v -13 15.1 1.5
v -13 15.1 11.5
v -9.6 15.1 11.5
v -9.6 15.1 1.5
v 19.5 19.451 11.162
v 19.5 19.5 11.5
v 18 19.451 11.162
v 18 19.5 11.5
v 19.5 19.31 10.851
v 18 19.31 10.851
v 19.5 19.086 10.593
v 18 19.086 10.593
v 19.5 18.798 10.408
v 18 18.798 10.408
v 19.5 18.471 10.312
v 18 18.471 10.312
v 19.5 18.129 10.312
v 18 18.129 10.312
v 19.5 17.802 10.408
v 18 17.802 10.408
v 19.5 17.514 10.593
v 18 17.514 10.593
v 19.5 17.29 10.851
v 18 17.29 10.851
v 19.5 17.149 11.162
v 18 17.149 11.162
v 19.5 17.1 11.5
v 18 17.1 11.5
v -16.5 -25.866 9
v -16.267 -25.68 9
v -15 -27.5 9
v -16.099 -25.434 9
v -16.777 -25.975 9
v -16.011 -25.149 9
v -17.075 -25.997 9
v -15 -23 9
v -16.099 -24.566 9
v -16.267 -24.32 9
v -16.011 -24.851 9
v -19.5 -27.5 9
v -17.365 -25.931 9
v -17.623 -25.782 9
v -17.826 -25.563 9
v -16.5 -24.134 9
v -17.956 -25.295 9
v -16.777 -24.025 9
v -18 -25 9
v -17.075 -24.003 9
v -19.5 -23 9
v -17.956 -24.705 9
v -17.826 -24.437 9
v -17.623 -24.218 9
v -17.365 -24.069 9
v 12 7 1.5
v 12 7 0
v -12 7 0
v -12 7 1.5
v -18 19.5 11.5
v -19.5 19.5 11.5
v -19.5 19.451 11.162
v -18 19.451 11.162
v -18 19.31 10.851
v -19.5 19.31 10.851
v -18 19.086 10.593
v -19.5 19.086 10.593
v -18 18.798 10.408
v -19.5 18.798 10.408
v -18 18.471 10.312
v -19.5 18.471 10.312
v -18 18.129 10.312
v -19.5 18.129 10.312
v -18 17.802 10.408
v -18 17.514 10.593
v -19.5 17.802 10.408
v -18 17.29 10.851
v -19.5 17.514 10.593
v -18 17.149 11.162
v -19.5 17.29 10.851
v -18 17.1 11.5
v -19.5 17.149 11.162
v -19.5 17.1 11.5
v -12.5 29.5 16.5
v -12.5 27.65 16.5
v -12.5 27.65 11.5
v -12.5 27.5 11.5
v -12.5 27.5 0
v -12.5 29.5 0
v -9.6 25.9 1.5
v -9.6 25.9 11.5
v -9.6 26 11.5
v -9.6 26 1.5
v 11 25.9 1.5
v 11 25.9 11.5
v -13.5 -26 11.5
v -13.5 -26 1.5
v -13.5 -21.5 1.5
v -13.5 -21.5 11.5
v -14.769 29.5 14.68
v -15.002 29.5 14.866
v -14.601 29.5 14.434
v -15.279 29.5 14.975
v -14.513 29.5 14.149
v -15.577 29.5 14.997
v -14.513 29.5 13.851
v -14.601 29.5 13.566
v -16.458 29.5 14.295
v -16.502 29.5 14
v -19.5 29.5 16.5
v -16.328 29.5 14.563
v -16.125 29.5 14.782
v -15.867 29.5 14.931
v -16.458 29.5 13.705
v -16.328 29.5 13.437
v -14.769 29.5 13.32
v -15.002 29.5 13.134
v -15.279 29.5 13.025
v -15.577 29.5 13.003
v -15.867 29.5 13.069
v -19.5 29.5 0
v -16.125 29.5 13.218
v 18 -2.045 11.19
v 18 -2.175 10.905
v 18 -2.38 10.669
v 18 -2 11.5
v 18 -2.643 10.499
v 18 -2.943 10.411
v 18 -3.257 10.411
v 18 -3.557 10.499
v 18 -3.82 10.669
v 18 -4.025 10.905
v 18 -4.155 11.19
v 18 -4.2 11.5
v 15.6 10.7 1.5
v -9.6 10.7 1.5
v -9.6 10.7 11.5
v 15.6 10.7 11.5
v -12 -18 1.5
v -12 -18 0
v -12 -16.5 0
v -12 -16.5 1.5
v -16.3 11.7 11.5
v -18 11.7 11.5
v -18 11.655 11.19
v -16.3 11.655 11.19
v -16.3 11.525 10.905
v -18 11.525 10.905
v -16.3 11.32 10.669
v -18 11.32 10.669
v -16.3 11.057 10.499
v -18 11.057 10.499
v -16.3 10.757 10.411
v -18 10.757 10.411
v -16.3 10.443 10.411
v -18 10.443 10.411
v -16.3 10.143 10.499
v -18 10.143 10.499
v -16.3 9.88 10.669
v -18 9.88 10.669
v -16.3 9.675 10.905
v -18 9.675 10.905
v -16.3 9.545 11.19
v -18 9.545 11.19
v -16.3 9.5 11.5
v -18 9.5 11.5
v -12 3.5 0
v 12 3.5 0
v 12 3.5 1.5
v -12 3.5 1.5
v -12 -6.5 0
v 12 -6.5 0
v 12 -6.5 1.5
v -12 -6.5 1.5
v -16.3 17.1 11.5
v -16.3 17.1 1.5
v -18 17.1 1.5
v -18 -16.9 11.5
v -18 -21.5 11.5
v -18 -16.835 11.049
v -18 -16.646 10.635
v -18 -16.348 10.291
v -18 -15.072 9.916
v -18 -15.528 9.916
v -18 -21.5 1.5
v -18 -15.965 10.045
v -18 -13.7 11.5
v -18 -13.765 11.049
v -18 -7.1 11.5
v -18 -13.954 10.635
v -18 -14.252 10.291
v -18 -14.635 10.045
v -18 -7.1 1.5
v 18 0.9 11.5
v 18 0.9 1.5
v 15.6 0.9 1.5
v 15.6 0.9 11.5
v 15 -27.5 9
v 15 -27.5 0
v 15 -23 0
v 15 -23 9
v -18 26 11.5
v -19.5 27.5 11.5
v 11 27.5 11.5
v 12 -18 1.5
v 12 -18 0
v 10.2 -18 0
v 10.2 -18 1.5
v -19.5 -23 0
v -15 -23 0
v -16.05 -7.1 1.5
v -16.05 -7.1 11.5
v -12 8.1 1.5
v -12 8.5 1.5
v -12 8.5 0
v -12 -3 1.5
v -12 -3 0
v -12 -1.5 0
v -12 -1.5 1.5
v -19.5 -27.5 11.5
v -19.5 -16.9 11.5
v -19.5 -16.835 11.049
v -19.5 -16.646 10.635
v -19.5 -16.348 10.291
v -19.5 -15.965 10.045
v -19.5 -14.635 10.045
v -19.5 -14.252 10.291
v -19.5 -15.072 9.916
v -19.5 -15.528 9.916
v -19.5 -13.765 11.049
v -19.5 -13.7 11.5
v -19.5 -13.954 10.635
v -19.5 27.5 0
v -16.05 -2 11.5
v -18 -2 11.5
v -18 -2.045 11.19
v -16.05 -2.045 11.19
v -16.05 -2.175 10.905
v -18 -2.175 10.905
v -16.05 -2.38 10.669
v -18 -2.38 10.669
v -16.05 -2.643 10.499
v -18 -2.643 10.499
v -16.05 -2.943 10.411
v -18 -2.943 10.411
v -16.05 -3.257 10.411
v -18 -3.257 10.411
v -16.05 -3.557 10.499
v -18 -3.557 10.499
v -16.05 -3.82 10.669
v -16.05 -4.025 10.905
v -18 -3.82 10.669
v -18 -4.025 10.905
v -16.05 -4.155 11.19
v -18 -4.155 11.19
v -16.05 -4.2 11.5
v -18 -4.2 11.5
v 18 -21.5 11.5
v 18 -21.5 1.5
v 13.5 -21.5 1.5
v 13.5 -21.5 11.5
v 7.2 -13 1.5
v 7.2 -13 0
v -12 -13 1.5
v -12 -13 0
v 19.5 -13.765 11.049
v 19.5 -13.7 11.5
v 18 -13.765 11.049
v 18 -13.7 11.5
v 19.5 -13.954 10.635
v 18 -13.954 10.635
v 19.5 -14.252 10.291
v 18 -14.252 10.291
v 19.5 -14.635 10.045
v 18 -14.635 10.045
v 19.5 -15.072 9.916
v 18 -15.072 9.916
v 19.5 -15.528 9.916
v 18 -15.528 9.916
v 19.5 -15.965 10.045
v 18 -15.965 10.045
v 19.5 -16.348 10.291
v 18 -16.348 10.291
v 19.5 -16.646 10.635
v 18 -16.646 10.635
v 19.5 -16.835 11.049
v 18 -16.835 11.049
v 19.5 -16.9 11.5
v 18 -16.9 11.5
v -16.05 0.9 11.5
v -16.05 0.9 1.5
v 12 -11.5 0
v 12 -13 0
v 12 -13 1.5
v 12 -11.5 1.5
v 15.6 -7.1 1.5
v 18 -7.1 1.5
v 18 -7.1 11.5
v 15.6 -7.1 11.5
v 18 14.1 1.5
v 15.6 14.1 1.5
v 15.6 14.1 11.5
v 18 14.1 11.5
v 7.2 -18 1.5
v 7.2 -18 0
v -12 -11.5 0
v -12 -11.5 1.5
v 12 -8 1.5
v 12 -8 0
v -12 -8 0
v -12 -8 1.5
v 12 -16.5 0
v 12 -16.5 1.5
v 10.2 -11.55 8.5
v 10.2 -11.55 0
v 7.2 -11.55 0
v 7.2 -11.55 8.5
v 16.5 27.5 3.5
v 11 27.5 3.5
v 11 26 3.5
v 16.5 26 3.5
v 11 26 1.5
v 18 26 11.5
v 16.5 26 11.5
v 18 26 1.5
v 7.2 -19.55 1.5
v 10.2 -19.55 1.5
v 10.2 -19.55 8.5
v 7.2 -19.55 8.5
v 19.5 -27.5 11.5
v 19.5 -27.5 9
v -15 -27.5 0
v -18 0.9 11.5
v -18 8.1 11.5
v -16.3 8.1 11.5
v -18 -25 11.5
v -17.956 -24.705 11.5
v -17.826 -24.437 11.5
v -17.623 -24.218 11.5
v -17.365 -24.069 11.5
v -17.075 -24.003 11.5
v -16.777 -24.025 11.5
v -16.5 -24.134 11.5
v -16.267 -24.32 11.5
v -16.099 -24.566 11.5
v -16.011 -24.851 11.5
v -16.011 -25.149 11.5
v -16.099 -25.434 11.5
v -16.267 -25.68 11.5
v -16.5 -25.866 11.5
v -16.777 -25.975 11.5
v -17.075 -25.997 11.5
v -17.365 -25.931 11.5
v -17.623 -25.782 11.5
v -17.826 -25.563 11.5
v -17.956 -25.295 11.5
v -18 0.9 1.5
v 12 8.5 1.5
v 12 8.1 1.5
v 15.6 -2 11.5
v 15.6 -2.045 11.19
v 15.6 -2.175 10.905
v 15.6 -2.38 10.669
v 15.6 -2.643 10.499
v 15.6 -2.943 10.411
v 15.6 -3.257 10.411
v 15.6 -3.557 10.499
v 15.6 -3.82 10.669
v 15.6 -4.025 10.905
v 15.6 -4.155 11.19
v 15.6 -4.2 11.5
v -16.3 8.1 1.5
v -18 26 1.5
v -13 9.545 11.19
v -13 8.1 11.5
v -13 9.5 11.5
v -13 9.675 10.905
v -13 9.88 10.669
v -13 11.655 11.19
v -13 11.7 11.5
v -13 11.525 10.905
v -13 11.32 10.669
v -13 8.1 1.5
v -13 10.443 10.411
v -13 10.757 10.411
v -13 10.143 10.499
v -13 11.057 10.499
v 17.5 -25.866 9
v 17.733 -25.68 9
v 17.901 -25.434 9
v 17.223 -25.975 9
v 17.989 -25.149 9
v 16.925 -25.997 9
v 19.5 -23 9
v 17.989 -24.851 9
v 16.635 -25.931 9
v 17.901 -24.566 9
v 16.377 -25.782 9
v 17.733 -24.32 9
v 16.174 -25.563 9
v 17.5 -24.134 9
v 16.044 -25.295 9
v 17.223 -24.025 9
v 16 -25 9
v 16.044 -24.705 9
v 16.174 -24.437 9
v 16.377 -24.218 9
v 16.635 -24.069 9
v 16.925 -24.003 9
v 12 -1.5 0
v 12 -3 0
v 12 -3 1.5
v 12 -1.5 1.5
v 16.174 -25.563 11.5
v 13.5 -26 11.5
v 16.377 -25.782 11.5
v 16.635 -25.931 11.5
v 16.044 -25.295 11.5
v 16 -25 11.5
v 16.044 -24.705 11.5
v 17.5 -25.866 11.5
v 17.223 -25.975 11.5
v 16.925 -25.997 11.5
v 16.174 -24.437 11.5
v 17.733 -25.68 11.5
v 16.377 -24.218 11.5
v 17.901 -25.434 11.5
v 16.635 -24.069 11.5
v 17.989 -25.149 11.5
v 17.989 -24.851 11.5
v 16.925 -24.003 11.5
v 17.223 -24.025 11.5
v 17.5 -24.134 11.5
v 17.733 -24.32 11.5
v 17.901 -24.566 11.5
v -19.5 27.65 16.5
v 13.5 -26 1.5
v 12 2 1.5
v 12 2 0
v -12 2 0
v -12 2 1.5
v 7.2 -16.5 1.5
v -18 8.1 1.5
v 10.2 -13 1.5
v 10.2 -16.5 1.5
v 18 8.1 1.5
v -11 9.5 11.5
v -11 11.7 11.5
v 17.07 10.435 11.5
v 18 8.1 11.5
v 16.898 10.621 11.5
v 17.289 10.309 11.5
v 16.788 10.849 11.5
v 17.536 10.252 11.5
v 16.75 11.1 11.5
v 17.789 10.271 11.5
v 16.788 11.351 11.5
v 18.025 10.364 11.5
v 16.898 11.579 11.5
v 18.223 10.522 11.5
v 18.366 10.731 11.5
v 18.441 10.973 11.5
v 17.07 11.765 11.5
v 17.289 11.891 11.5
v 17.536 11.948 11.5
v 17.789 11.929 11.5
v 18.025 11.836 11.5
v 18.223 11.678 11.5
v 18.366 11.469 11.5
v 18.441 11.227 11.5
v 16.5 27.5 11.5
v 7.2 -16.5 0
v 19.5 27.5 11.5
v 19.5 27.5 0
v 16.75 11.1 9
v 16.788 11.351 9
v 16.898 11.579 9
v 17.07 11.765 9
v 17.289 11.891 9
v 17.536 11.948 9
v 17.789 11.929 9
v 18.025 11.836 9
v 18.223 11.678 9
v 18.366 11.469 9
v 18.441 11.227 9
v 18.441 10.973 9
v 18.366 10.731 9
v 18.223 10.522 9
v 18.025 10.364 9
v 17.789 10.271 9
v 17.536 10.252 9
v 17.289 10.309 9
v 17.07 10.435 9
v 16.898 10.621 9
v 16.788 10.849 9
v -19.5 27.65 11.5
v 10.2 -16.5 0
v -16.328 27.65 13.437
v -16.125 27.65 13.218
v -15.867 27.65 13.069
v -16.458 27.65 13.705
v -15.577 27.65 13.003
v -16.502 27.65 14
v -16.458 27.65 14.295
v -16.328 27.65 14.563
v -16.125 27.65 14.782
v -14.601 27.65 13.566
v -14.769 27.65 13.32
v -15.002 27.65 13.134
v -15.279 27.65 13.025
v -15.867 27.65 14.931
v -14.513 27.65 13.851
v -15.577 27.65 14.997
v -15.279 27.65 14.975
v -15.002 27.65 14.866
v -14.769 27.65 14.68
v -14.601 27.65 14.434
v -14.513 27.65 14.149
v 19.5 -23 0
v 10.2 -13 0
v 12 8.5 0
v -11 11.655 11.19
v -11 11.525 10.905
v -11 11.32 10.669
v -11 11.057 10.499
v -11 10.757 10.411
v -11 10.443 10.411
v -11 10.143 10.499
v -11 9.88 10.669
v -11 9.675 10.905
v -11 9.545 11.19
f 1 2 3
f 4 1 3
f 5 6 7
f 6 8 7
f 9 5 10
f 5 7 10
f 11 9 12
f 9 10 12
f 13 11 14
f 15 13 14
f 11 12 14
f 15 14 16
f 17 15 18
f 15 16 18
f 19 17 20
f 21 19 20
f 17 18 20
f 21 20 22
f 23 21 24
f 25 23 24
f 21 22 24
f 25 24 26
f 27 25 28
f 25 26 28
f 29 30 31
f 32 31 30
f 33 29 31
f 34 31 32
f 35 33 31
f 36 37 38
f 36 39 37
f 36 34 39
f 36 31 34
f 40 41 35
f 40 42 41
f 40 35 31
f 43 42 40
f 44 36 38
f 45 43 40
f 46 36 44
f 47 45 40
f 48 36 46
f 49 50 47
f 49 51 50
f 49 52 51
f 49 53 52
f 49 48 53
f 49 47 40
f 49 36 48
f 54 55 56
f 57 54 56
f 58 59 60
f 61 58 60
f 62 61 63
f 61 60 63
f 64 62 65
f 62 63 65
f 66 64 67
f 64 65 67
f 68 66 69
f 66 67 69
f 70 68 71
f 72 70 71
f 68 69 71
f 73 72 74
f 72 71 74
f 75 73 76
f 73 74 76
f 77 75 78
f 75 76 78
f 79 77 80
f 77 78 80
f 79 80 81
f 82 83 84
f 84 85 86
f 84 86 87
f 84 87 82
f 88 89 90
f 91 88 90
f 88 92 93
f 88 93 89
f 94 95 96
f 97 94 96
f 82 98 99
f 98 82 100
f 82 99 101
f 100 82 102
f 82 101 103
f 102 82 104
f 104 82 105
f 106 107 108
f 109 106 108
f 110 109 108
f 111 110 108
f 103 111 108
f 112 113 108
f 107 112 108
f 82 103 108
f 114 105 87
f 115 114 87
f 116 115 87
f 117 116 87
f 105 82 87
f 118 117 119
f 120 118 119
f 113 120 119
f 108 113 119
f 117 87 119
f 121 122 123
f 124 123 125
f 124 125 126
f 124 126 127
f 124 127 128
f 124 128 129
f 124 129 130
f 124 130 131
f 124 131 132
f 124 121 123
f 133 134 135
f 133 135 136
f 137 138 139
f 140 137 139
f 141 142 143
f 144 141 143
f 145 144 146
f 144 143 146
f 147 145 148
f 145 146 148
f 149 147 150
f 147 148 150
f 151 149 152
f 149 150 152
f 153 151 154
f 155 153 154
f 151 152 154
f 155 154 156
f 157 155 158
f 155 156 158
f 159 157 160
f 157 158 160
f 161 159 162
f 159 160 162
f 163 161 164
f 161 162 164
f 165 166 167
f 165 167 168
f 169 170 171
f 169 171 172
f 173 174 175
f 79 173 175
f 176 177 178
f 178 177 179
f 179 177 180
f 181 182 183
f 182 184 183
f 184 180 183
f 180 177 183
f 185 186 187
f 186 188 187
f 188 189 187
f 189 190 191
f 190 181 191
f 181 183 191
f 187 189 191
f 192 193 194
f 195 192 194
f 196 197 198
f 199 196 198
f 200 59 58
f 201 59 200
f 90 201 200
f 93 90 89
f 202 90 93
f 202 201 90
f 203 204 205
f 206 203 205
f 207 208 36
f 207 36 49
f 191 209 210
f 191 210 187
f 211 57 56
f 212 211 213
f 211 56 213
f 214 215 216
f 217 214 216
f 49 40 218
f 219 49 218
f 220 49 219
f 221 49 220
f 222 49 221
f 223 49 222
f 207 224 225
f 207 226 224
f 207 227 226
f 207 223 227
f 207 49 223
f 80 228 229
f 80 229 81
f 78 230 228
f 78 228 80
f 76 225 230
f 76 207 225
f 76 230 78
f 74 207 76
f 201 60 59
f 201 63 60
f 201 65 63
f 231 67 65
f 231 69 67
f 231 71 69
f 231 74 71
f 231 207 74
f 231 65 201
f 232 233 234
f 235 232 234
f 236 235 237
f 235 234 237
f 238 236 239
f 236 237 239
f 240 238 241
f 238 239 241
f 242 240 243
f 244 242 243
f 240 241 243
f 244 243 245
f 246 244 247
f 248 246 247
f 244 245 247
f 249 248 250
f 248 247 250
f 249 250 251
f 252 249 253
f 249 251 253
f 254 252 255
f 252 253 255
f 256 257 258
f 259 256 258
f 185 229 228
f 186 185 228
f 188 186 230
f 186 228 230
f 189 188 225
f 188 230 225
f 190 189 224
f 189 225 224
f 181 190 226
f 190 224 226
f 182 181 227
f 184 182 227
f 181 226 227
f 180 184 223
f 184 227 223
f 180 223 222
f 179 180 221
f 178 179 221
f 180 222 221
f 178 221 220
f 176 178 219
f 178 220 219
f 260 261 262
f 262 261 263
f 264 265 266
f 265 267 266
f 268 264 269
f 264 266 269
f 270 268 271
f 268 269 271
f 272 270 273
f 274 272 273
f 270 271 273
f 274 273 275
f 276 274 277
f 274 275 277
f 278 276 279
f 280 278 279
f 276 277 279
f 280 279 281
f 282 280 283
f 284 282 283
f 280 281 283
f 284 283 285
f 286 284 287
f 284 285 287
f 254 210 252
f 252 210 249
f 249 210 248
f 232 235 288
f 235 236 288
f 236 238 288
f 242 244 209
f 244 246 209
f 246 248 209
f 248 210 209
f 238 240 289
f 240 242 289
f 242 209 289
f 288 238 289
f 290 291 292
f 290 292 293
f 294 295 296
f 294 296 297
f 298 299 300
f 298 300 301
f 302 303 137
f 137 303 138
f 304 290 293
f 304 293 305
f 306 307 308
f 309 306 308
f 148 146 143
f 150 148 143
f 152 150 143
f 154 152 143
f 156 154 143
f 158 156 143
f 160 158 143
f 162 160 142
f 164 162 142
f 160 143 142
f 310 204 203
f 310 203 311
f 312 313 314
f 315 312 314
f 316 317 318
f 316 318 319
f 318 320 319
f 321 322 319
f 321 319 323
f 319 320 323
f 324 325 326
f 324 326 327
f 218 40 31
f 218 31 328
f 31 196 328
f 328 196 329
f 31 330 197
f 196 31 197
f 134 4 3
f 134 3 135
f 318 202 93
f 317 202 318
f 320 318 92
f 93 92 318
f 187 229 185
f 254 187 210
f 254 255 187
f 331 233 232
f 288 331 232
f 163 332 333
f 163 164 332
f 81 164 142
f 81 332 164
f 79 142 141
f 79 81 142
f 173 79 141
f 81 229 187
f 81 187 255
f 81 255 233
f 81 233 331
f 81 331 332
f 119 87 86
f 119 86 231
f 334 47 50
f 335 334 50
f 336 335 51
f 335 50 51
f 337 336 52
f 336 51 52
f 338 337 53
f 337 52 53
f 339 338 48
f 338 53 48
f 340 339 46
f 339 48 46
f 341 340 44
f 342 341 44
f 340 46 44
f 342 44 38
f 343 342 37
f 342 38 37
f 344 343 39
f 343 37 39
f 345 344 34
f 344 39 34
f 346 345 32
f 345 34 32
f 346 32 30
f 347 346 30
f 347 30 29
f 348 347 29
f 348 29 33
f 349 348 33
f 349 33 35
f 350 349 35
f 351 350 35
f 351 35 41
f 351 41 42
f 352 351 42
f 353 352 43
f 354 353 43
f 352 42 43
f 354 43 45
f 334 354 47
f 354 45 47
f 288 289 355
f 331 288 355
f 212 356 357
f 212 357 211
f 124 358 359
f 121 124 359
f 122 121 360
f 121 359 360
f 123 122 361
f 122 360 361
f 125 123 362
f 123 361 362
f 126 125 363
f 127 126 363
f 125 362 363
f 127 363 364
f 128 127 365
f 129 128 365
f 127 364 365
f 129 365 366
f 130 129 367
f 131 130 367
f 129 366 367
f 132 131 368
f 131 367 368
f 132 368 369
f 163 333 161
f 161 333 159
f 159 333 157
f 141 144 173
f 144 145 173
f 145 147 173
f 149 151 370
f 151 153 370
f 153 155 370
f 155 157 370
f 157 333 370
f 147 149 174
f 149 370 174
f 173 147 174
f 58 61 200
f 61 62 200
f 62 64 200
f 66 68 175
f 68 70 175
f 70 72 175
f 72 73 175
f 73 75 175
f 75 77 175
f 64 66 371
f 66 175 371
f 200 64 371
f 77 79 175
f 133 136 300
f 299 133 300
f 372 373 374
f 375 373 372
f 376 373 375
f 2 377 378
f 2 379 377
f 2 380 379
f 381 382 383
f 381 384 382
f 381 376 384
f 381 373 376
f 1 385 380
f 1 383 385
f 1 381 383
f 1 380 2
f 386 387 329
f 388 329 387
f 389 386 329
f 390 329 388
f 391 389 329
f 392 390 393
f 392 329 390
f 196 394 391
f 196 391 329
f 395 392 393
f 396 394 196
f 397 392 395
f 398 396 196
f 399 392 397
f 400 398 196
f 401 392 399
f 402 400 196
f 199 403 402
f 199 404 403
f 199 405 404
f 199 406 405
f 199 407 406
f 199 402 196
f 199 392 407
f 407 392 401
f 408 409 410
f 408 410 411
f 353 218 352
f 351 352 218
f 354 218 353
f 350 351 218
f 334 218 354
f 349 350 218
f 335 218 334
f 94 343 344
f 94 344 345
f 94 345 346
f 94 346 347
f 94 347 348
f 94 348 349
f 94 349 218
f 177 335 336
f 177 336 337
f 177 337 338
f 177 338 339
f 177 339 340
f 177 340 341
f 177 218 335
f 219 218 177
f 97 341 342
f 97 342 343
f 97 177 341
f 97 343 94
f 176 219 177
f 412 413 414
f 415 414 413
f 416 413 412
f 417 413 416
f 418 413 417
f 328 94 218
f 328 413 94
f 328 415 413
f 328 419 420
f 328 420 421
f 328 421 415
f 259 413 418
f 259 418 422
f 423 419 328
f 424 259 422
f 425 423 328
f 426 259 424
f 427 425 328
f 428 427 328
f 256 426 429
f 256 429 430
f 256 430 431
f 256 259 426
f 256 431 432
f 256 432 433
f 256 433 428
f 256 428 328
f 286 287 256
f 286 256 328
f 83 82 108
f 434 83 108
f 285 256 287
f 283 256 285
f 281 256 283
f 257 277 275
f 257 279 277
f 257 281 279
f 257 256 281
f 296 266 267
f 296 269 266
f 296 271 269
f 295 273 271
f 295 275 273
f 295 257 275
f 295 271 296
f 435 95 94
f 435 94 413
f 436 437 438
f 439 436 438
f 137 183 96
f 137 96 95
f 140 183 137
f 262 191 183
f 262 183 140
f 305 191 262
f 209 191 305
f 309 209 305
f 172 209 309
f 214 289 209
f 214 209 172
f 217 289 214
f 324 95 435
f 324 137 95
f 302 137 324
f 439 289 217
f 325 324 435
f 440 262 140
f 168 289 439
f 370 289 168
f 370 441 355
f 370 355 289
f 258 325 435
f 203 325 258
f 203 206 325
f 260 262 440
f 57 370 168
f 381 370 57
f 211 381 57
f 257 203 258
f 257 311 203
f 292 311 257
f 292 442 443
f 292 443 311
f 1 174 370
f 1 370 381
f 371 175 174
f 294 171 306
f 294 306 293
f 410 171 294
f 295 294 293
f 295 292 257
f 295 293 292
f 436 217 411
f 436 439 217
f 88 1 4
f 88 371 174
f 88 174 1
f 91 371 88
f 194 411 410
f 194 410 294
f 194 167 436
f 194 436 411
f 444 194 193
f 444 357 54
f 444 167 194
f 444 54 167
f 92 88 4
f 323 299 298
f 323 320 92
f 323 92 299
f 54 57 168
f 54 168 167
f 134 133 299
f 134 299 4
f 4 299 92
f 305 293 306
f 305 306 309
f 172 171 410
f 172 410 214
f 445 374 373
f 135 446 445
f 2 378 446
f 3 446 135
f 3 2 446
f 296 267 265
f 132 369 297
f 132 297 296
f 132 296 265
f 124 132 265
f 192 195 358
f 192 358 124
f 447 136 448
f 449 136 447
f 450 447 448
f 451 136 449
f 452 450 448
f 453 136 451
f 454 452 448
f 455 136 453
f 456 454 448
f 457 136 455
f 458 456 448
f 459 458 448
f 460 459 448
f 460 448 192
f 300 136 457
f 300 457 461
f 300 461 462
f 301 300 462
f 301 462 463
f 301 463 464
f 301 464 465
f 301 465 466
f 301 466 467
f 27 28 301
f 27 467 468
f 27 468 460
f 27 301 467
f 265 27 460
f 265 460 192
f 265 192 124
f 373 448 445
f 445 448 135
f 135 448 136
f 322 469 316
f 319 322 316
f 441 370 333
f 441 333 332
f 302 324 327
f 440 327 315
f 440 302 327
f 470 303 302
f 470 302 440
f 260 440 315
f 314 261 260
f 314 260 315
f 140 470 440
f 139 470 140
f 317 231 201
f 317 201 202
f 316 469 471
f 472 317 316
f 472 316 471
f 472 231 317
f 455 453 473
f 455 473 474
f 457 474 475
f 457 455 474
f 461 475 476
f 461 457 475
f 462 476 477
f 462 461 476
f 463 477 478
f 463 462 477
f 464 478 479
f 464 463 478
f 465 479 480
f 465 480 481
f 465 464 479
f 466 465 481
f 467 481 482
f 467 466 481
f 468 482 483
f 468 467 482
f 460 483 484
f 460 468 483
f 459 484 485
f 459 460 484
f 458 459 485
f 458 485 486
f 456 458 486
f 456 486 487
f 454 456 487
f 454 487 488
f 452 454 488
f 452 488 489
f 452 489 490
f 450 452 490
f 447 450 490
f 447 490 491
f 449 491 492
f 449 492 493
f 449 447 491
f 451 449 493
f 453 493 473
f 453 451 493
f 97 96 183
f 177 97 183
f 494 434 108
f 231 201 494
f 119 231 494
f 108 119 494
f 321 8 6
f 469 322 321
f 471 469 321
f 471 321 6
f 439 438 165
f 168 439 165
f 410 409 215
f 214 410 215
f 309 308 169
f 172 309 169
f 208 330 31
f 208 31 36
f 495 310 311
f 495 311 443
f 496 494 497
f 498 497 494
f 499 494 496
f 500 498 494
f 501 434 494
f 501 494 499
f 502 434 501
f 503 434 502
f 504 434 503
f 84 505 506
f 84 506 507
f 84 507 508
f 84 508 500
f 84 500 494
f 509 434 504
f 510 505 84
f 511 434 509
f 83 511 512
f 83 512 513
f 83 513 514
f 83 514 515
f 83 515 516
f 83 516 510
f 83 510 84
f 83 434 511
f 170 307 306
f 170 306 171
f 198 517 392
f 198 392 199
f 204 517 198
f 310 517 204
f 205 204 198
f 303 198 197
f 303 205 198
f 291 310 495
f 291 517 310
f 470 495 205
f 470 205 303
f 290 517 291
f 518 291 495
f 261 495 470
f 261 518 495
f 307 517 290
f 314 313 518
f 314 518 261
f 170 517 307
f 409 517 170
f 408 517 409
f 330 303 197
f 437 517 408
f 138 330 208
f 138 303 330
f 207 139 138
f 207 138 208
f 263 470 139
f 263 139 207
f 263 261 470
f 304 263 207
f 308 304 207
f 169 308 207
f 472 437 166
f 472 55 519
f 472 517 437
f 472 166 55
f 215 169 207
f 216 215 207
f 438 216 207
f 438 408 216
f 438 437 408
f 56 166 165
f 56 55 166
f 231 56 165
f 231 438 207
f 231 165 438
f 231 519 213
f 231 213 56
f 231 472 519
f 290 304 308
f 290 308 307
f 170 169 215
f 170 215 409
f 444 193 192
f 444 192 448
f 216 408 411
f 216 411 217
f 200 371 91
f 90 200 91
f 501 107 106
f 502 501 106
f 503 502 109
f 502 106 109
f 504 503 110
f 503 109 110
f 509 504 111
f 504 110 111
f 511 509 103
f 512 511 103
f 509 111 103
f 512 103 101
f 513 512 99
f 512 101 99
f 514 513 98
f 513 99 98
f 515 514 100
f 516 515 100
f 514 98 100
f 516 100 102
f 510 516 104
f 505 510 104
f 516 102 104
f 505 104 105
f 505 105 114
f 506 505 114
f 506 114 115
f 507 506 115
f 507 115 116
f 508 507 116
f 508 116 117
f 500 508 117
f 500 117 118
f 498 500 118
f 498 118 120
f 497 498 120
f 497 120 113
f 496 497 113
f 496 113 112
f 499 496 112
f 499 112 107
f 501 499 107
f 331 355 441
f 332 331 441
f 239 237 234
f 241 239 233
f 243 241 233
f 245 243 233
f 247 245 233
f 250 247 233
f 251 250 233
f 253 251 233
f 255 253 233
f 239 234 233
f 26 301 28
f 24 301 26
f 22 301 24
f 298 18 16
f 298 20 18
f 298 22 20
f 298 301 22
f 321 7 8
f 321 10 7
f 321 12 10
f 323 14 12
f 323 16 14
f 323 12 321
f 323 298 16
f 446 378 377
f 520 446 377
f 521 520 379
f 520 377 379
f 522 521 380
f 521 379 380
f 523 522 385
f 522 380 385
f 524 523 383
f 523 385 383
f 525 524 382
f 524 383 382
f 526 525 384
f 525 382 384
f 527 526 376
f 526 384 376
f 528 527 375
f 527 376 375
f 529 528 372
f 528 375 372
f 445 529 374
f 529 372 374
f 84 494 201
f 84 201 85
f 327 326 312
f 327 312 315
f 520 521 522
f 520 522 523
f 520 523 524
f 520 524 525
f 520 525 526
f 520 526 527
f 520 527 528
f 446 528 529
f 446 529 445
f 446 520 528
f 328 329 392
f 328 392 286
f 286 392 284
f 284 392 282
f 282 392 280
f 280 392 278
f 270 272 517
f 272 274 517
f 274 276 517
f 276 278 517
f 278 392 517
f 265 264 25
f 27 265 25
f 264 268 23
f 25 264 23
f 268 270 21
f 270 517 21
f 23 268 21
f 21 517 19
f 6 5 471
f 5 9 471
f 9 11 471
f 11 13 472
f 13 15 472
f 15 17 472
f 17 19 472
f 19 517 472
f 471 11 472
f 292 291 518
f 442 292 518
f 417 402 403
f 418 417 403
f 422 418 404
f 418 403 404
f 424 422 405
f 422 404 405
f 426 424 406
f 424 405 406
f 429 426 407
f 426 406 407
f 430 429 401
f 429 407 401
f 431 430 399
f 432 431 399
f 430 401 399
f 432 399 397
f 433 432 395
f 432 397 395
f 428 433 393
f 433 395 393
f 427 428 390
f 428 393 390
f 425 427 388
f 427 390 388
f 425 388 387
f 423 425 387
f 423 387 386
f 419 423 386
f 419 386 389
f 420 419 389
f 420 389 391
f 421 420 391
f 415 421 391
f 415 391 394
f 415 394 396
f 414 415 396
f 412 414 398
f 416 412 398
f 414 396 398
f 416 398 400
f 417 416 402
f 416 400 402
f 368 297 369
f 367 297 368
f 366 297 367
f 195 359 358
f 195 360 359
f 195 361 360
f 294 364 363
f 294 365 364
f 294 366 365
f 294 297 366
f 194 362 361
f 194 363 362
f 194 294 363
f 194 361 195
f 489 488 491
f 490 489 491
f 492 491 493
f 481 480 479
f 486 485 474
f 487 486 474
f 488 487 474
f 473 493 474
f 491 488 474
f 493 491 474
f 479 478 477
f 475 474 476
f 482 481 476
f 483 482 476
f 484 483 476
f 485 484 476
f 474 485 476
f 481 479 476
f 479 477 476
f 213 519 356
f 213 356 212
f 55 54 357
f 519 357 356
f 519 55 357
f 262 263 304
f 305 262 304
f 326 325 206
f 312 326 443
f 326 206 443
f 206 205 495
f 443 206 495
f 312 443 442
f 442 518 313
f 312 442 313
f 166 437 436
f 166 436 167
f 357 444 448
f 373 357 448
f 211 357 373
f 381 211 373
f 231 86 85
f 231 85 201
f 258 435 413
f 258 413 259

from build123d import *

# Parameters (mm, degrees)
SKETCH_1_W           = 39
SKETCH_1_H           = 55
EXTRUDE_1_DEPTH      = 11.5
SHELL_1_T            = -1.5
SKETCH_2_W           = 7
SKETCH_2_H           = 2
EXTRUDE_2_DEPTH      = 16.5
SKETCH_3_R           = 1
CUT_EXTRUDE_1_DEPTH  = 2
SKETCH_4_W           = 5.5
SKETCH_4_H           = 8
CUT_EXTRUDE_2_DEPTH  = 1.5
SKETCH_5_R           = 1.2
SKETCH_5_R_2         = 1.6
CUT_EXTRUDE_3_DEPTH  = 52.609107723
SKETCH_8_W           = 1.95
SKETCH_8_H           = 8
SKETCH_8_W_2         = 2.4
SKETCH_8_W_3         = 1.7
SKETCH_8_H_2         = 9
SKETCH_8_W_4         = 4.5
SKETCH_8_H_3         = 4.5
SKETCH_8_W_5         = 20.6
SKETCH_8_H_4         = 0.1
EXTRUDE_3_DEPTH      = 11.5
CUT_EXTRUDE_START    = -1.5
SKETCH_10_R          = 1.1
CUT_EXTRUDE_12_DEPTH = 7
SKETCH_7_R           = 1.1
CUT_EXTRUDE_13_DEPTH = 36
SKETCH_13_W          = 24
SKETCH_13_H          = 1.5
CUT_EXTRUDE_14_DEPTH = 1.5
SKETCH_12_W          = 3
SKETCH_12_H          = 8
EXTRUDE_4_DEPTH      = 8.5
SKETCH_14_W          = 7
SKETCH_14_H          = 0.15
CUT_EXTRUDE_15_DEPTH = 5
SKETCH_15_W          = 4.5
SKETCH_15_H          = 4.5
CUT_EXTRUDE_16_DEPTH = 9
SKETCH_16_R          = 1
CUT_EXTRUDE_17_DEPTH = 2.5
CUT_EXTRUDE_START_2  = -11.5
SKETCH_17_R          = 0.85
CUT_EXTRUDE_18_DEPTH = 2.5


with BuildPart() as part:
    # 草图1 → 凸台-拉伸1 (new body)
    with BuildSketch(Plane.XY):
        Rectangle(SKETCH_1_W, SKETCH_1_H)
    extrude(amount=EXTRUDE_1_DEPTH)

    # 抽壳1
    shell_1_openings = [part.faces().sort_by_distance(p)[0] for p in [
        (0, 0, 11.5),
    ]]
    offset(amount=SHELL_1_T, openings=shell_1_openings, kind=Kind.INTERSECTION)

    # 草图4 → 切除-拉伸2 (cut)
    with BuildSketch(Plane(origin=(0, 27.5, 0), x_dir=(1, 0, 0), z_dir=(0, 1, 0))):
        with Locations((13.75, -7.5)):
            Rectangle(SKETCH_4_W, SKETCH_4_H)
    extrude(amount=-CUT_EXTRUDE_2_DEPTH, mode=Mode.SUBTRACT)

    # 草图5 → 切除-拉伸3 (cut, through all)
    with BuildSketch(Plane.ZY.offset(19.5)):
        with Locations((11.5, 18.3)):
            Circle(SKETCH_5_R)
        with Locations((11.5, -15.3)):
            Circle(SKETCH_5_R_2)
    extrude(amount=-CUT_EXTRUDE_3_DEPTH, mode=Mode.SUBTRACT)

    # 草图8 → 凸台-拉伸3 (add)
    with BuildSketch(Plane(origin=(0, 0, 0), x_dir=(-1, 0, 0), z_dir=(0, 0, -1))):
        with Locations((17.025, -3.1)):
            Rectangle(SKETCH_8_W, SKETCH_8_H)
        with Locations((-16.8, -3.1)):
            Rectangle(SKETCH_8_W_2, SKETCH_8_H)
        Polygon((-15.6, 14.1), (-18, 14.1), (-18, 8.1), (13, 8.1), (13, 15.1), (9.6, 15.1), (9.6, 10.7), (-15.6, 10.7), align=None)
        with Locations((17.15, 12.6)):
            Rectangle(SKETCH_8_W_3, SKETCH_8_H_2)
        with Locations((15.75, -23.75)):
            Rectangle(SKETCH_8_W_4, SKETCH_8_H_3)
        with Locations((-15.75, -23.75)):
            Rectangle(SKETCH_8_W_4, SKETCH_8_H_3)
        with Locations((-0.7, 25.95)):
            Rectangle(SKETCH_8_W_5, SKETCH_8_H_4)
    extrude(amount=-EXTRUDE_3_DEPTH)

    # 草图10 → 切除-拉伸12 (cut)
    with BuildSketch(Plane.ZY.offset(19.5).offset(CUT_EXTRUDE_START)):
        with Locations((11.5, 10.6)):
            Circle(SKETCH_10_R)
    extrude(amount=-CUT_EXTRUDE_12_DEPTH, mode=Mode.SUBTRACT)

    # 草图7 → 切除-拉伸13 (cut)
    with BuildSketch(Plane.ZY.offset(19.5).offset(CUT_EXTRUDE_START)):
        with Locations((11.5, -3.1)):
            Circle(SKETCH_7_R)
    extrude(amount=-CUT_EXTRUDE_13_DEPTH, mode=Mode.SUBTRACT)

    # 草图13 → 切除-拉伸14 (cut)
    with BuildSketch(Plane(origin=(0, 0, 0), x_dir=(-1, 0, 0), z_dir=(0, 0, -1))):
        with Locations((0, -17.25)):
            Rectangle(SKETCH_13_W, SKETCH_13_H)
        with Locations((0, -12.25)):
            Rectangle(SKETCH_13_W, SKETCH_13_H)
        with Locations((0, -7.25)):
            Rectangle(SKETCH_13_W, SKETCH_13_H)
        with Locations((0, -2.25)):
            Rectangle(SKETCH_13_W, SKETCH_13_H)
        with Locations((0, 2.75)):
            Rectangle(SKETCH_13_W, SKETCH_13_H)
        with Locations((0, 7.75)):
            Rectangle(SKETCH_13_W, SKETCH_13_H)
    extrude(amount=-CUT_EXTRUDE_14_DEPTH, mode=Mode.SUBTRACT)

    # 草图12 → 凸台-拉伸4 (add)
    with BuildSketch(Plane(origin=(0, 0, 0), x_dir=(-1, 0, 0), z_dir=(0, 0, -1))):
        with Locations((-8.7, -15.55)):
            Rectangle(SKETCH_12_W, SKETCH_12_H)
    extrude(amount=-EXTRUDE_4_DEPTH)

    # 草图15 → 切除-拉伸16 (cut)
    with BuildSketch(Plane(origin=(0, 0, 0), x_dir=(-1, 0, 0), z_dir=(0, 0, -1))):
        with Locations((17.25, -25.25)):
            Rectangle(SKETCH_15_W, SKETCH_15_H)
        with Locations((-17.25, -25.25)):
            Rectangle(SKETCH_15_W, SKETCH_15_H)
    extrude(amount=-CUT_EXTRUDE_16_DEPTH, mode=Mode.SUBTRACT)

    # 草图16 → 切除-拉伸17 (cut)
    with BuildSketch(Plane(origin=(0, 0, 9), x_dir=(-1, 0, 0), z_dir=(0, 0, -1))):
        with Locations((-17, -25)):
            Circle(SKETCH_16_R)
        with Locations((17, -25)):
            Circle(SKETCH_16_R)
    extrude(amount=-CUT_EXTRUDE_17_DEPTH, mode=Mode.SUBTRACT)

    # 草图17 → 切除-拉伸18 (cut)
    with BuildSketch(Plane(origin=(0, 0, 0), x_dir=(-1, 0, 0), z_dir=(0, 0, -1)).offset(CUT_EXTRUDE_START_2)):
        with Locations((-17.6, 11.1)):
            Circle(SKETCH_17_R)
    extrude(amount=CUT_EXTRUDE_18_DEPTH, mode=Mode.SUBTRACT)


with BuildPart() as body_2:
    # 草图2 → 凸台-拉伸2 (new body)
    with BuildSketch(Plane(origin=(0, 0, 0), x_dir=(-1, 0, 0), z_dir=(0, 0, -1))):
        with Locations((16, 28.5)):
            Rectangle(SKETCH_2_W, SKETCH_2_H)
    extrude(amount=-EXTRUDE_2_DEPTH)

    # 草图3 → 切除-拉伸1 (cut)
    with BuildSketch(Plane(origin=(0, 29.5, 0), x_dir=(1, 0, 0), z_dir=(0, 1, 0))):
        with Locations(Location((-15.501988962, -14, 0), (0, 0, 180))):
            Circle(SKETCH_3_R)
    extrude(amount=-CUT_EXTRUDE_1_DEPTH, mode=Mode.SUBTRACT)

    # 草图14 → 切除-拉伸15 (cut)
    with BuildSketch(Plane.XY.offset(16.5)):
        with Locations((-16, 27.575)):
            Rectangle(SKETCH_14_W, SKETCH_14_H)
    extrude(amount=-CUT_EXTRUDE_15_DEPTH, mode=Mode.SUBTRACT)


solid = Compound([part.part, body_2.part])
